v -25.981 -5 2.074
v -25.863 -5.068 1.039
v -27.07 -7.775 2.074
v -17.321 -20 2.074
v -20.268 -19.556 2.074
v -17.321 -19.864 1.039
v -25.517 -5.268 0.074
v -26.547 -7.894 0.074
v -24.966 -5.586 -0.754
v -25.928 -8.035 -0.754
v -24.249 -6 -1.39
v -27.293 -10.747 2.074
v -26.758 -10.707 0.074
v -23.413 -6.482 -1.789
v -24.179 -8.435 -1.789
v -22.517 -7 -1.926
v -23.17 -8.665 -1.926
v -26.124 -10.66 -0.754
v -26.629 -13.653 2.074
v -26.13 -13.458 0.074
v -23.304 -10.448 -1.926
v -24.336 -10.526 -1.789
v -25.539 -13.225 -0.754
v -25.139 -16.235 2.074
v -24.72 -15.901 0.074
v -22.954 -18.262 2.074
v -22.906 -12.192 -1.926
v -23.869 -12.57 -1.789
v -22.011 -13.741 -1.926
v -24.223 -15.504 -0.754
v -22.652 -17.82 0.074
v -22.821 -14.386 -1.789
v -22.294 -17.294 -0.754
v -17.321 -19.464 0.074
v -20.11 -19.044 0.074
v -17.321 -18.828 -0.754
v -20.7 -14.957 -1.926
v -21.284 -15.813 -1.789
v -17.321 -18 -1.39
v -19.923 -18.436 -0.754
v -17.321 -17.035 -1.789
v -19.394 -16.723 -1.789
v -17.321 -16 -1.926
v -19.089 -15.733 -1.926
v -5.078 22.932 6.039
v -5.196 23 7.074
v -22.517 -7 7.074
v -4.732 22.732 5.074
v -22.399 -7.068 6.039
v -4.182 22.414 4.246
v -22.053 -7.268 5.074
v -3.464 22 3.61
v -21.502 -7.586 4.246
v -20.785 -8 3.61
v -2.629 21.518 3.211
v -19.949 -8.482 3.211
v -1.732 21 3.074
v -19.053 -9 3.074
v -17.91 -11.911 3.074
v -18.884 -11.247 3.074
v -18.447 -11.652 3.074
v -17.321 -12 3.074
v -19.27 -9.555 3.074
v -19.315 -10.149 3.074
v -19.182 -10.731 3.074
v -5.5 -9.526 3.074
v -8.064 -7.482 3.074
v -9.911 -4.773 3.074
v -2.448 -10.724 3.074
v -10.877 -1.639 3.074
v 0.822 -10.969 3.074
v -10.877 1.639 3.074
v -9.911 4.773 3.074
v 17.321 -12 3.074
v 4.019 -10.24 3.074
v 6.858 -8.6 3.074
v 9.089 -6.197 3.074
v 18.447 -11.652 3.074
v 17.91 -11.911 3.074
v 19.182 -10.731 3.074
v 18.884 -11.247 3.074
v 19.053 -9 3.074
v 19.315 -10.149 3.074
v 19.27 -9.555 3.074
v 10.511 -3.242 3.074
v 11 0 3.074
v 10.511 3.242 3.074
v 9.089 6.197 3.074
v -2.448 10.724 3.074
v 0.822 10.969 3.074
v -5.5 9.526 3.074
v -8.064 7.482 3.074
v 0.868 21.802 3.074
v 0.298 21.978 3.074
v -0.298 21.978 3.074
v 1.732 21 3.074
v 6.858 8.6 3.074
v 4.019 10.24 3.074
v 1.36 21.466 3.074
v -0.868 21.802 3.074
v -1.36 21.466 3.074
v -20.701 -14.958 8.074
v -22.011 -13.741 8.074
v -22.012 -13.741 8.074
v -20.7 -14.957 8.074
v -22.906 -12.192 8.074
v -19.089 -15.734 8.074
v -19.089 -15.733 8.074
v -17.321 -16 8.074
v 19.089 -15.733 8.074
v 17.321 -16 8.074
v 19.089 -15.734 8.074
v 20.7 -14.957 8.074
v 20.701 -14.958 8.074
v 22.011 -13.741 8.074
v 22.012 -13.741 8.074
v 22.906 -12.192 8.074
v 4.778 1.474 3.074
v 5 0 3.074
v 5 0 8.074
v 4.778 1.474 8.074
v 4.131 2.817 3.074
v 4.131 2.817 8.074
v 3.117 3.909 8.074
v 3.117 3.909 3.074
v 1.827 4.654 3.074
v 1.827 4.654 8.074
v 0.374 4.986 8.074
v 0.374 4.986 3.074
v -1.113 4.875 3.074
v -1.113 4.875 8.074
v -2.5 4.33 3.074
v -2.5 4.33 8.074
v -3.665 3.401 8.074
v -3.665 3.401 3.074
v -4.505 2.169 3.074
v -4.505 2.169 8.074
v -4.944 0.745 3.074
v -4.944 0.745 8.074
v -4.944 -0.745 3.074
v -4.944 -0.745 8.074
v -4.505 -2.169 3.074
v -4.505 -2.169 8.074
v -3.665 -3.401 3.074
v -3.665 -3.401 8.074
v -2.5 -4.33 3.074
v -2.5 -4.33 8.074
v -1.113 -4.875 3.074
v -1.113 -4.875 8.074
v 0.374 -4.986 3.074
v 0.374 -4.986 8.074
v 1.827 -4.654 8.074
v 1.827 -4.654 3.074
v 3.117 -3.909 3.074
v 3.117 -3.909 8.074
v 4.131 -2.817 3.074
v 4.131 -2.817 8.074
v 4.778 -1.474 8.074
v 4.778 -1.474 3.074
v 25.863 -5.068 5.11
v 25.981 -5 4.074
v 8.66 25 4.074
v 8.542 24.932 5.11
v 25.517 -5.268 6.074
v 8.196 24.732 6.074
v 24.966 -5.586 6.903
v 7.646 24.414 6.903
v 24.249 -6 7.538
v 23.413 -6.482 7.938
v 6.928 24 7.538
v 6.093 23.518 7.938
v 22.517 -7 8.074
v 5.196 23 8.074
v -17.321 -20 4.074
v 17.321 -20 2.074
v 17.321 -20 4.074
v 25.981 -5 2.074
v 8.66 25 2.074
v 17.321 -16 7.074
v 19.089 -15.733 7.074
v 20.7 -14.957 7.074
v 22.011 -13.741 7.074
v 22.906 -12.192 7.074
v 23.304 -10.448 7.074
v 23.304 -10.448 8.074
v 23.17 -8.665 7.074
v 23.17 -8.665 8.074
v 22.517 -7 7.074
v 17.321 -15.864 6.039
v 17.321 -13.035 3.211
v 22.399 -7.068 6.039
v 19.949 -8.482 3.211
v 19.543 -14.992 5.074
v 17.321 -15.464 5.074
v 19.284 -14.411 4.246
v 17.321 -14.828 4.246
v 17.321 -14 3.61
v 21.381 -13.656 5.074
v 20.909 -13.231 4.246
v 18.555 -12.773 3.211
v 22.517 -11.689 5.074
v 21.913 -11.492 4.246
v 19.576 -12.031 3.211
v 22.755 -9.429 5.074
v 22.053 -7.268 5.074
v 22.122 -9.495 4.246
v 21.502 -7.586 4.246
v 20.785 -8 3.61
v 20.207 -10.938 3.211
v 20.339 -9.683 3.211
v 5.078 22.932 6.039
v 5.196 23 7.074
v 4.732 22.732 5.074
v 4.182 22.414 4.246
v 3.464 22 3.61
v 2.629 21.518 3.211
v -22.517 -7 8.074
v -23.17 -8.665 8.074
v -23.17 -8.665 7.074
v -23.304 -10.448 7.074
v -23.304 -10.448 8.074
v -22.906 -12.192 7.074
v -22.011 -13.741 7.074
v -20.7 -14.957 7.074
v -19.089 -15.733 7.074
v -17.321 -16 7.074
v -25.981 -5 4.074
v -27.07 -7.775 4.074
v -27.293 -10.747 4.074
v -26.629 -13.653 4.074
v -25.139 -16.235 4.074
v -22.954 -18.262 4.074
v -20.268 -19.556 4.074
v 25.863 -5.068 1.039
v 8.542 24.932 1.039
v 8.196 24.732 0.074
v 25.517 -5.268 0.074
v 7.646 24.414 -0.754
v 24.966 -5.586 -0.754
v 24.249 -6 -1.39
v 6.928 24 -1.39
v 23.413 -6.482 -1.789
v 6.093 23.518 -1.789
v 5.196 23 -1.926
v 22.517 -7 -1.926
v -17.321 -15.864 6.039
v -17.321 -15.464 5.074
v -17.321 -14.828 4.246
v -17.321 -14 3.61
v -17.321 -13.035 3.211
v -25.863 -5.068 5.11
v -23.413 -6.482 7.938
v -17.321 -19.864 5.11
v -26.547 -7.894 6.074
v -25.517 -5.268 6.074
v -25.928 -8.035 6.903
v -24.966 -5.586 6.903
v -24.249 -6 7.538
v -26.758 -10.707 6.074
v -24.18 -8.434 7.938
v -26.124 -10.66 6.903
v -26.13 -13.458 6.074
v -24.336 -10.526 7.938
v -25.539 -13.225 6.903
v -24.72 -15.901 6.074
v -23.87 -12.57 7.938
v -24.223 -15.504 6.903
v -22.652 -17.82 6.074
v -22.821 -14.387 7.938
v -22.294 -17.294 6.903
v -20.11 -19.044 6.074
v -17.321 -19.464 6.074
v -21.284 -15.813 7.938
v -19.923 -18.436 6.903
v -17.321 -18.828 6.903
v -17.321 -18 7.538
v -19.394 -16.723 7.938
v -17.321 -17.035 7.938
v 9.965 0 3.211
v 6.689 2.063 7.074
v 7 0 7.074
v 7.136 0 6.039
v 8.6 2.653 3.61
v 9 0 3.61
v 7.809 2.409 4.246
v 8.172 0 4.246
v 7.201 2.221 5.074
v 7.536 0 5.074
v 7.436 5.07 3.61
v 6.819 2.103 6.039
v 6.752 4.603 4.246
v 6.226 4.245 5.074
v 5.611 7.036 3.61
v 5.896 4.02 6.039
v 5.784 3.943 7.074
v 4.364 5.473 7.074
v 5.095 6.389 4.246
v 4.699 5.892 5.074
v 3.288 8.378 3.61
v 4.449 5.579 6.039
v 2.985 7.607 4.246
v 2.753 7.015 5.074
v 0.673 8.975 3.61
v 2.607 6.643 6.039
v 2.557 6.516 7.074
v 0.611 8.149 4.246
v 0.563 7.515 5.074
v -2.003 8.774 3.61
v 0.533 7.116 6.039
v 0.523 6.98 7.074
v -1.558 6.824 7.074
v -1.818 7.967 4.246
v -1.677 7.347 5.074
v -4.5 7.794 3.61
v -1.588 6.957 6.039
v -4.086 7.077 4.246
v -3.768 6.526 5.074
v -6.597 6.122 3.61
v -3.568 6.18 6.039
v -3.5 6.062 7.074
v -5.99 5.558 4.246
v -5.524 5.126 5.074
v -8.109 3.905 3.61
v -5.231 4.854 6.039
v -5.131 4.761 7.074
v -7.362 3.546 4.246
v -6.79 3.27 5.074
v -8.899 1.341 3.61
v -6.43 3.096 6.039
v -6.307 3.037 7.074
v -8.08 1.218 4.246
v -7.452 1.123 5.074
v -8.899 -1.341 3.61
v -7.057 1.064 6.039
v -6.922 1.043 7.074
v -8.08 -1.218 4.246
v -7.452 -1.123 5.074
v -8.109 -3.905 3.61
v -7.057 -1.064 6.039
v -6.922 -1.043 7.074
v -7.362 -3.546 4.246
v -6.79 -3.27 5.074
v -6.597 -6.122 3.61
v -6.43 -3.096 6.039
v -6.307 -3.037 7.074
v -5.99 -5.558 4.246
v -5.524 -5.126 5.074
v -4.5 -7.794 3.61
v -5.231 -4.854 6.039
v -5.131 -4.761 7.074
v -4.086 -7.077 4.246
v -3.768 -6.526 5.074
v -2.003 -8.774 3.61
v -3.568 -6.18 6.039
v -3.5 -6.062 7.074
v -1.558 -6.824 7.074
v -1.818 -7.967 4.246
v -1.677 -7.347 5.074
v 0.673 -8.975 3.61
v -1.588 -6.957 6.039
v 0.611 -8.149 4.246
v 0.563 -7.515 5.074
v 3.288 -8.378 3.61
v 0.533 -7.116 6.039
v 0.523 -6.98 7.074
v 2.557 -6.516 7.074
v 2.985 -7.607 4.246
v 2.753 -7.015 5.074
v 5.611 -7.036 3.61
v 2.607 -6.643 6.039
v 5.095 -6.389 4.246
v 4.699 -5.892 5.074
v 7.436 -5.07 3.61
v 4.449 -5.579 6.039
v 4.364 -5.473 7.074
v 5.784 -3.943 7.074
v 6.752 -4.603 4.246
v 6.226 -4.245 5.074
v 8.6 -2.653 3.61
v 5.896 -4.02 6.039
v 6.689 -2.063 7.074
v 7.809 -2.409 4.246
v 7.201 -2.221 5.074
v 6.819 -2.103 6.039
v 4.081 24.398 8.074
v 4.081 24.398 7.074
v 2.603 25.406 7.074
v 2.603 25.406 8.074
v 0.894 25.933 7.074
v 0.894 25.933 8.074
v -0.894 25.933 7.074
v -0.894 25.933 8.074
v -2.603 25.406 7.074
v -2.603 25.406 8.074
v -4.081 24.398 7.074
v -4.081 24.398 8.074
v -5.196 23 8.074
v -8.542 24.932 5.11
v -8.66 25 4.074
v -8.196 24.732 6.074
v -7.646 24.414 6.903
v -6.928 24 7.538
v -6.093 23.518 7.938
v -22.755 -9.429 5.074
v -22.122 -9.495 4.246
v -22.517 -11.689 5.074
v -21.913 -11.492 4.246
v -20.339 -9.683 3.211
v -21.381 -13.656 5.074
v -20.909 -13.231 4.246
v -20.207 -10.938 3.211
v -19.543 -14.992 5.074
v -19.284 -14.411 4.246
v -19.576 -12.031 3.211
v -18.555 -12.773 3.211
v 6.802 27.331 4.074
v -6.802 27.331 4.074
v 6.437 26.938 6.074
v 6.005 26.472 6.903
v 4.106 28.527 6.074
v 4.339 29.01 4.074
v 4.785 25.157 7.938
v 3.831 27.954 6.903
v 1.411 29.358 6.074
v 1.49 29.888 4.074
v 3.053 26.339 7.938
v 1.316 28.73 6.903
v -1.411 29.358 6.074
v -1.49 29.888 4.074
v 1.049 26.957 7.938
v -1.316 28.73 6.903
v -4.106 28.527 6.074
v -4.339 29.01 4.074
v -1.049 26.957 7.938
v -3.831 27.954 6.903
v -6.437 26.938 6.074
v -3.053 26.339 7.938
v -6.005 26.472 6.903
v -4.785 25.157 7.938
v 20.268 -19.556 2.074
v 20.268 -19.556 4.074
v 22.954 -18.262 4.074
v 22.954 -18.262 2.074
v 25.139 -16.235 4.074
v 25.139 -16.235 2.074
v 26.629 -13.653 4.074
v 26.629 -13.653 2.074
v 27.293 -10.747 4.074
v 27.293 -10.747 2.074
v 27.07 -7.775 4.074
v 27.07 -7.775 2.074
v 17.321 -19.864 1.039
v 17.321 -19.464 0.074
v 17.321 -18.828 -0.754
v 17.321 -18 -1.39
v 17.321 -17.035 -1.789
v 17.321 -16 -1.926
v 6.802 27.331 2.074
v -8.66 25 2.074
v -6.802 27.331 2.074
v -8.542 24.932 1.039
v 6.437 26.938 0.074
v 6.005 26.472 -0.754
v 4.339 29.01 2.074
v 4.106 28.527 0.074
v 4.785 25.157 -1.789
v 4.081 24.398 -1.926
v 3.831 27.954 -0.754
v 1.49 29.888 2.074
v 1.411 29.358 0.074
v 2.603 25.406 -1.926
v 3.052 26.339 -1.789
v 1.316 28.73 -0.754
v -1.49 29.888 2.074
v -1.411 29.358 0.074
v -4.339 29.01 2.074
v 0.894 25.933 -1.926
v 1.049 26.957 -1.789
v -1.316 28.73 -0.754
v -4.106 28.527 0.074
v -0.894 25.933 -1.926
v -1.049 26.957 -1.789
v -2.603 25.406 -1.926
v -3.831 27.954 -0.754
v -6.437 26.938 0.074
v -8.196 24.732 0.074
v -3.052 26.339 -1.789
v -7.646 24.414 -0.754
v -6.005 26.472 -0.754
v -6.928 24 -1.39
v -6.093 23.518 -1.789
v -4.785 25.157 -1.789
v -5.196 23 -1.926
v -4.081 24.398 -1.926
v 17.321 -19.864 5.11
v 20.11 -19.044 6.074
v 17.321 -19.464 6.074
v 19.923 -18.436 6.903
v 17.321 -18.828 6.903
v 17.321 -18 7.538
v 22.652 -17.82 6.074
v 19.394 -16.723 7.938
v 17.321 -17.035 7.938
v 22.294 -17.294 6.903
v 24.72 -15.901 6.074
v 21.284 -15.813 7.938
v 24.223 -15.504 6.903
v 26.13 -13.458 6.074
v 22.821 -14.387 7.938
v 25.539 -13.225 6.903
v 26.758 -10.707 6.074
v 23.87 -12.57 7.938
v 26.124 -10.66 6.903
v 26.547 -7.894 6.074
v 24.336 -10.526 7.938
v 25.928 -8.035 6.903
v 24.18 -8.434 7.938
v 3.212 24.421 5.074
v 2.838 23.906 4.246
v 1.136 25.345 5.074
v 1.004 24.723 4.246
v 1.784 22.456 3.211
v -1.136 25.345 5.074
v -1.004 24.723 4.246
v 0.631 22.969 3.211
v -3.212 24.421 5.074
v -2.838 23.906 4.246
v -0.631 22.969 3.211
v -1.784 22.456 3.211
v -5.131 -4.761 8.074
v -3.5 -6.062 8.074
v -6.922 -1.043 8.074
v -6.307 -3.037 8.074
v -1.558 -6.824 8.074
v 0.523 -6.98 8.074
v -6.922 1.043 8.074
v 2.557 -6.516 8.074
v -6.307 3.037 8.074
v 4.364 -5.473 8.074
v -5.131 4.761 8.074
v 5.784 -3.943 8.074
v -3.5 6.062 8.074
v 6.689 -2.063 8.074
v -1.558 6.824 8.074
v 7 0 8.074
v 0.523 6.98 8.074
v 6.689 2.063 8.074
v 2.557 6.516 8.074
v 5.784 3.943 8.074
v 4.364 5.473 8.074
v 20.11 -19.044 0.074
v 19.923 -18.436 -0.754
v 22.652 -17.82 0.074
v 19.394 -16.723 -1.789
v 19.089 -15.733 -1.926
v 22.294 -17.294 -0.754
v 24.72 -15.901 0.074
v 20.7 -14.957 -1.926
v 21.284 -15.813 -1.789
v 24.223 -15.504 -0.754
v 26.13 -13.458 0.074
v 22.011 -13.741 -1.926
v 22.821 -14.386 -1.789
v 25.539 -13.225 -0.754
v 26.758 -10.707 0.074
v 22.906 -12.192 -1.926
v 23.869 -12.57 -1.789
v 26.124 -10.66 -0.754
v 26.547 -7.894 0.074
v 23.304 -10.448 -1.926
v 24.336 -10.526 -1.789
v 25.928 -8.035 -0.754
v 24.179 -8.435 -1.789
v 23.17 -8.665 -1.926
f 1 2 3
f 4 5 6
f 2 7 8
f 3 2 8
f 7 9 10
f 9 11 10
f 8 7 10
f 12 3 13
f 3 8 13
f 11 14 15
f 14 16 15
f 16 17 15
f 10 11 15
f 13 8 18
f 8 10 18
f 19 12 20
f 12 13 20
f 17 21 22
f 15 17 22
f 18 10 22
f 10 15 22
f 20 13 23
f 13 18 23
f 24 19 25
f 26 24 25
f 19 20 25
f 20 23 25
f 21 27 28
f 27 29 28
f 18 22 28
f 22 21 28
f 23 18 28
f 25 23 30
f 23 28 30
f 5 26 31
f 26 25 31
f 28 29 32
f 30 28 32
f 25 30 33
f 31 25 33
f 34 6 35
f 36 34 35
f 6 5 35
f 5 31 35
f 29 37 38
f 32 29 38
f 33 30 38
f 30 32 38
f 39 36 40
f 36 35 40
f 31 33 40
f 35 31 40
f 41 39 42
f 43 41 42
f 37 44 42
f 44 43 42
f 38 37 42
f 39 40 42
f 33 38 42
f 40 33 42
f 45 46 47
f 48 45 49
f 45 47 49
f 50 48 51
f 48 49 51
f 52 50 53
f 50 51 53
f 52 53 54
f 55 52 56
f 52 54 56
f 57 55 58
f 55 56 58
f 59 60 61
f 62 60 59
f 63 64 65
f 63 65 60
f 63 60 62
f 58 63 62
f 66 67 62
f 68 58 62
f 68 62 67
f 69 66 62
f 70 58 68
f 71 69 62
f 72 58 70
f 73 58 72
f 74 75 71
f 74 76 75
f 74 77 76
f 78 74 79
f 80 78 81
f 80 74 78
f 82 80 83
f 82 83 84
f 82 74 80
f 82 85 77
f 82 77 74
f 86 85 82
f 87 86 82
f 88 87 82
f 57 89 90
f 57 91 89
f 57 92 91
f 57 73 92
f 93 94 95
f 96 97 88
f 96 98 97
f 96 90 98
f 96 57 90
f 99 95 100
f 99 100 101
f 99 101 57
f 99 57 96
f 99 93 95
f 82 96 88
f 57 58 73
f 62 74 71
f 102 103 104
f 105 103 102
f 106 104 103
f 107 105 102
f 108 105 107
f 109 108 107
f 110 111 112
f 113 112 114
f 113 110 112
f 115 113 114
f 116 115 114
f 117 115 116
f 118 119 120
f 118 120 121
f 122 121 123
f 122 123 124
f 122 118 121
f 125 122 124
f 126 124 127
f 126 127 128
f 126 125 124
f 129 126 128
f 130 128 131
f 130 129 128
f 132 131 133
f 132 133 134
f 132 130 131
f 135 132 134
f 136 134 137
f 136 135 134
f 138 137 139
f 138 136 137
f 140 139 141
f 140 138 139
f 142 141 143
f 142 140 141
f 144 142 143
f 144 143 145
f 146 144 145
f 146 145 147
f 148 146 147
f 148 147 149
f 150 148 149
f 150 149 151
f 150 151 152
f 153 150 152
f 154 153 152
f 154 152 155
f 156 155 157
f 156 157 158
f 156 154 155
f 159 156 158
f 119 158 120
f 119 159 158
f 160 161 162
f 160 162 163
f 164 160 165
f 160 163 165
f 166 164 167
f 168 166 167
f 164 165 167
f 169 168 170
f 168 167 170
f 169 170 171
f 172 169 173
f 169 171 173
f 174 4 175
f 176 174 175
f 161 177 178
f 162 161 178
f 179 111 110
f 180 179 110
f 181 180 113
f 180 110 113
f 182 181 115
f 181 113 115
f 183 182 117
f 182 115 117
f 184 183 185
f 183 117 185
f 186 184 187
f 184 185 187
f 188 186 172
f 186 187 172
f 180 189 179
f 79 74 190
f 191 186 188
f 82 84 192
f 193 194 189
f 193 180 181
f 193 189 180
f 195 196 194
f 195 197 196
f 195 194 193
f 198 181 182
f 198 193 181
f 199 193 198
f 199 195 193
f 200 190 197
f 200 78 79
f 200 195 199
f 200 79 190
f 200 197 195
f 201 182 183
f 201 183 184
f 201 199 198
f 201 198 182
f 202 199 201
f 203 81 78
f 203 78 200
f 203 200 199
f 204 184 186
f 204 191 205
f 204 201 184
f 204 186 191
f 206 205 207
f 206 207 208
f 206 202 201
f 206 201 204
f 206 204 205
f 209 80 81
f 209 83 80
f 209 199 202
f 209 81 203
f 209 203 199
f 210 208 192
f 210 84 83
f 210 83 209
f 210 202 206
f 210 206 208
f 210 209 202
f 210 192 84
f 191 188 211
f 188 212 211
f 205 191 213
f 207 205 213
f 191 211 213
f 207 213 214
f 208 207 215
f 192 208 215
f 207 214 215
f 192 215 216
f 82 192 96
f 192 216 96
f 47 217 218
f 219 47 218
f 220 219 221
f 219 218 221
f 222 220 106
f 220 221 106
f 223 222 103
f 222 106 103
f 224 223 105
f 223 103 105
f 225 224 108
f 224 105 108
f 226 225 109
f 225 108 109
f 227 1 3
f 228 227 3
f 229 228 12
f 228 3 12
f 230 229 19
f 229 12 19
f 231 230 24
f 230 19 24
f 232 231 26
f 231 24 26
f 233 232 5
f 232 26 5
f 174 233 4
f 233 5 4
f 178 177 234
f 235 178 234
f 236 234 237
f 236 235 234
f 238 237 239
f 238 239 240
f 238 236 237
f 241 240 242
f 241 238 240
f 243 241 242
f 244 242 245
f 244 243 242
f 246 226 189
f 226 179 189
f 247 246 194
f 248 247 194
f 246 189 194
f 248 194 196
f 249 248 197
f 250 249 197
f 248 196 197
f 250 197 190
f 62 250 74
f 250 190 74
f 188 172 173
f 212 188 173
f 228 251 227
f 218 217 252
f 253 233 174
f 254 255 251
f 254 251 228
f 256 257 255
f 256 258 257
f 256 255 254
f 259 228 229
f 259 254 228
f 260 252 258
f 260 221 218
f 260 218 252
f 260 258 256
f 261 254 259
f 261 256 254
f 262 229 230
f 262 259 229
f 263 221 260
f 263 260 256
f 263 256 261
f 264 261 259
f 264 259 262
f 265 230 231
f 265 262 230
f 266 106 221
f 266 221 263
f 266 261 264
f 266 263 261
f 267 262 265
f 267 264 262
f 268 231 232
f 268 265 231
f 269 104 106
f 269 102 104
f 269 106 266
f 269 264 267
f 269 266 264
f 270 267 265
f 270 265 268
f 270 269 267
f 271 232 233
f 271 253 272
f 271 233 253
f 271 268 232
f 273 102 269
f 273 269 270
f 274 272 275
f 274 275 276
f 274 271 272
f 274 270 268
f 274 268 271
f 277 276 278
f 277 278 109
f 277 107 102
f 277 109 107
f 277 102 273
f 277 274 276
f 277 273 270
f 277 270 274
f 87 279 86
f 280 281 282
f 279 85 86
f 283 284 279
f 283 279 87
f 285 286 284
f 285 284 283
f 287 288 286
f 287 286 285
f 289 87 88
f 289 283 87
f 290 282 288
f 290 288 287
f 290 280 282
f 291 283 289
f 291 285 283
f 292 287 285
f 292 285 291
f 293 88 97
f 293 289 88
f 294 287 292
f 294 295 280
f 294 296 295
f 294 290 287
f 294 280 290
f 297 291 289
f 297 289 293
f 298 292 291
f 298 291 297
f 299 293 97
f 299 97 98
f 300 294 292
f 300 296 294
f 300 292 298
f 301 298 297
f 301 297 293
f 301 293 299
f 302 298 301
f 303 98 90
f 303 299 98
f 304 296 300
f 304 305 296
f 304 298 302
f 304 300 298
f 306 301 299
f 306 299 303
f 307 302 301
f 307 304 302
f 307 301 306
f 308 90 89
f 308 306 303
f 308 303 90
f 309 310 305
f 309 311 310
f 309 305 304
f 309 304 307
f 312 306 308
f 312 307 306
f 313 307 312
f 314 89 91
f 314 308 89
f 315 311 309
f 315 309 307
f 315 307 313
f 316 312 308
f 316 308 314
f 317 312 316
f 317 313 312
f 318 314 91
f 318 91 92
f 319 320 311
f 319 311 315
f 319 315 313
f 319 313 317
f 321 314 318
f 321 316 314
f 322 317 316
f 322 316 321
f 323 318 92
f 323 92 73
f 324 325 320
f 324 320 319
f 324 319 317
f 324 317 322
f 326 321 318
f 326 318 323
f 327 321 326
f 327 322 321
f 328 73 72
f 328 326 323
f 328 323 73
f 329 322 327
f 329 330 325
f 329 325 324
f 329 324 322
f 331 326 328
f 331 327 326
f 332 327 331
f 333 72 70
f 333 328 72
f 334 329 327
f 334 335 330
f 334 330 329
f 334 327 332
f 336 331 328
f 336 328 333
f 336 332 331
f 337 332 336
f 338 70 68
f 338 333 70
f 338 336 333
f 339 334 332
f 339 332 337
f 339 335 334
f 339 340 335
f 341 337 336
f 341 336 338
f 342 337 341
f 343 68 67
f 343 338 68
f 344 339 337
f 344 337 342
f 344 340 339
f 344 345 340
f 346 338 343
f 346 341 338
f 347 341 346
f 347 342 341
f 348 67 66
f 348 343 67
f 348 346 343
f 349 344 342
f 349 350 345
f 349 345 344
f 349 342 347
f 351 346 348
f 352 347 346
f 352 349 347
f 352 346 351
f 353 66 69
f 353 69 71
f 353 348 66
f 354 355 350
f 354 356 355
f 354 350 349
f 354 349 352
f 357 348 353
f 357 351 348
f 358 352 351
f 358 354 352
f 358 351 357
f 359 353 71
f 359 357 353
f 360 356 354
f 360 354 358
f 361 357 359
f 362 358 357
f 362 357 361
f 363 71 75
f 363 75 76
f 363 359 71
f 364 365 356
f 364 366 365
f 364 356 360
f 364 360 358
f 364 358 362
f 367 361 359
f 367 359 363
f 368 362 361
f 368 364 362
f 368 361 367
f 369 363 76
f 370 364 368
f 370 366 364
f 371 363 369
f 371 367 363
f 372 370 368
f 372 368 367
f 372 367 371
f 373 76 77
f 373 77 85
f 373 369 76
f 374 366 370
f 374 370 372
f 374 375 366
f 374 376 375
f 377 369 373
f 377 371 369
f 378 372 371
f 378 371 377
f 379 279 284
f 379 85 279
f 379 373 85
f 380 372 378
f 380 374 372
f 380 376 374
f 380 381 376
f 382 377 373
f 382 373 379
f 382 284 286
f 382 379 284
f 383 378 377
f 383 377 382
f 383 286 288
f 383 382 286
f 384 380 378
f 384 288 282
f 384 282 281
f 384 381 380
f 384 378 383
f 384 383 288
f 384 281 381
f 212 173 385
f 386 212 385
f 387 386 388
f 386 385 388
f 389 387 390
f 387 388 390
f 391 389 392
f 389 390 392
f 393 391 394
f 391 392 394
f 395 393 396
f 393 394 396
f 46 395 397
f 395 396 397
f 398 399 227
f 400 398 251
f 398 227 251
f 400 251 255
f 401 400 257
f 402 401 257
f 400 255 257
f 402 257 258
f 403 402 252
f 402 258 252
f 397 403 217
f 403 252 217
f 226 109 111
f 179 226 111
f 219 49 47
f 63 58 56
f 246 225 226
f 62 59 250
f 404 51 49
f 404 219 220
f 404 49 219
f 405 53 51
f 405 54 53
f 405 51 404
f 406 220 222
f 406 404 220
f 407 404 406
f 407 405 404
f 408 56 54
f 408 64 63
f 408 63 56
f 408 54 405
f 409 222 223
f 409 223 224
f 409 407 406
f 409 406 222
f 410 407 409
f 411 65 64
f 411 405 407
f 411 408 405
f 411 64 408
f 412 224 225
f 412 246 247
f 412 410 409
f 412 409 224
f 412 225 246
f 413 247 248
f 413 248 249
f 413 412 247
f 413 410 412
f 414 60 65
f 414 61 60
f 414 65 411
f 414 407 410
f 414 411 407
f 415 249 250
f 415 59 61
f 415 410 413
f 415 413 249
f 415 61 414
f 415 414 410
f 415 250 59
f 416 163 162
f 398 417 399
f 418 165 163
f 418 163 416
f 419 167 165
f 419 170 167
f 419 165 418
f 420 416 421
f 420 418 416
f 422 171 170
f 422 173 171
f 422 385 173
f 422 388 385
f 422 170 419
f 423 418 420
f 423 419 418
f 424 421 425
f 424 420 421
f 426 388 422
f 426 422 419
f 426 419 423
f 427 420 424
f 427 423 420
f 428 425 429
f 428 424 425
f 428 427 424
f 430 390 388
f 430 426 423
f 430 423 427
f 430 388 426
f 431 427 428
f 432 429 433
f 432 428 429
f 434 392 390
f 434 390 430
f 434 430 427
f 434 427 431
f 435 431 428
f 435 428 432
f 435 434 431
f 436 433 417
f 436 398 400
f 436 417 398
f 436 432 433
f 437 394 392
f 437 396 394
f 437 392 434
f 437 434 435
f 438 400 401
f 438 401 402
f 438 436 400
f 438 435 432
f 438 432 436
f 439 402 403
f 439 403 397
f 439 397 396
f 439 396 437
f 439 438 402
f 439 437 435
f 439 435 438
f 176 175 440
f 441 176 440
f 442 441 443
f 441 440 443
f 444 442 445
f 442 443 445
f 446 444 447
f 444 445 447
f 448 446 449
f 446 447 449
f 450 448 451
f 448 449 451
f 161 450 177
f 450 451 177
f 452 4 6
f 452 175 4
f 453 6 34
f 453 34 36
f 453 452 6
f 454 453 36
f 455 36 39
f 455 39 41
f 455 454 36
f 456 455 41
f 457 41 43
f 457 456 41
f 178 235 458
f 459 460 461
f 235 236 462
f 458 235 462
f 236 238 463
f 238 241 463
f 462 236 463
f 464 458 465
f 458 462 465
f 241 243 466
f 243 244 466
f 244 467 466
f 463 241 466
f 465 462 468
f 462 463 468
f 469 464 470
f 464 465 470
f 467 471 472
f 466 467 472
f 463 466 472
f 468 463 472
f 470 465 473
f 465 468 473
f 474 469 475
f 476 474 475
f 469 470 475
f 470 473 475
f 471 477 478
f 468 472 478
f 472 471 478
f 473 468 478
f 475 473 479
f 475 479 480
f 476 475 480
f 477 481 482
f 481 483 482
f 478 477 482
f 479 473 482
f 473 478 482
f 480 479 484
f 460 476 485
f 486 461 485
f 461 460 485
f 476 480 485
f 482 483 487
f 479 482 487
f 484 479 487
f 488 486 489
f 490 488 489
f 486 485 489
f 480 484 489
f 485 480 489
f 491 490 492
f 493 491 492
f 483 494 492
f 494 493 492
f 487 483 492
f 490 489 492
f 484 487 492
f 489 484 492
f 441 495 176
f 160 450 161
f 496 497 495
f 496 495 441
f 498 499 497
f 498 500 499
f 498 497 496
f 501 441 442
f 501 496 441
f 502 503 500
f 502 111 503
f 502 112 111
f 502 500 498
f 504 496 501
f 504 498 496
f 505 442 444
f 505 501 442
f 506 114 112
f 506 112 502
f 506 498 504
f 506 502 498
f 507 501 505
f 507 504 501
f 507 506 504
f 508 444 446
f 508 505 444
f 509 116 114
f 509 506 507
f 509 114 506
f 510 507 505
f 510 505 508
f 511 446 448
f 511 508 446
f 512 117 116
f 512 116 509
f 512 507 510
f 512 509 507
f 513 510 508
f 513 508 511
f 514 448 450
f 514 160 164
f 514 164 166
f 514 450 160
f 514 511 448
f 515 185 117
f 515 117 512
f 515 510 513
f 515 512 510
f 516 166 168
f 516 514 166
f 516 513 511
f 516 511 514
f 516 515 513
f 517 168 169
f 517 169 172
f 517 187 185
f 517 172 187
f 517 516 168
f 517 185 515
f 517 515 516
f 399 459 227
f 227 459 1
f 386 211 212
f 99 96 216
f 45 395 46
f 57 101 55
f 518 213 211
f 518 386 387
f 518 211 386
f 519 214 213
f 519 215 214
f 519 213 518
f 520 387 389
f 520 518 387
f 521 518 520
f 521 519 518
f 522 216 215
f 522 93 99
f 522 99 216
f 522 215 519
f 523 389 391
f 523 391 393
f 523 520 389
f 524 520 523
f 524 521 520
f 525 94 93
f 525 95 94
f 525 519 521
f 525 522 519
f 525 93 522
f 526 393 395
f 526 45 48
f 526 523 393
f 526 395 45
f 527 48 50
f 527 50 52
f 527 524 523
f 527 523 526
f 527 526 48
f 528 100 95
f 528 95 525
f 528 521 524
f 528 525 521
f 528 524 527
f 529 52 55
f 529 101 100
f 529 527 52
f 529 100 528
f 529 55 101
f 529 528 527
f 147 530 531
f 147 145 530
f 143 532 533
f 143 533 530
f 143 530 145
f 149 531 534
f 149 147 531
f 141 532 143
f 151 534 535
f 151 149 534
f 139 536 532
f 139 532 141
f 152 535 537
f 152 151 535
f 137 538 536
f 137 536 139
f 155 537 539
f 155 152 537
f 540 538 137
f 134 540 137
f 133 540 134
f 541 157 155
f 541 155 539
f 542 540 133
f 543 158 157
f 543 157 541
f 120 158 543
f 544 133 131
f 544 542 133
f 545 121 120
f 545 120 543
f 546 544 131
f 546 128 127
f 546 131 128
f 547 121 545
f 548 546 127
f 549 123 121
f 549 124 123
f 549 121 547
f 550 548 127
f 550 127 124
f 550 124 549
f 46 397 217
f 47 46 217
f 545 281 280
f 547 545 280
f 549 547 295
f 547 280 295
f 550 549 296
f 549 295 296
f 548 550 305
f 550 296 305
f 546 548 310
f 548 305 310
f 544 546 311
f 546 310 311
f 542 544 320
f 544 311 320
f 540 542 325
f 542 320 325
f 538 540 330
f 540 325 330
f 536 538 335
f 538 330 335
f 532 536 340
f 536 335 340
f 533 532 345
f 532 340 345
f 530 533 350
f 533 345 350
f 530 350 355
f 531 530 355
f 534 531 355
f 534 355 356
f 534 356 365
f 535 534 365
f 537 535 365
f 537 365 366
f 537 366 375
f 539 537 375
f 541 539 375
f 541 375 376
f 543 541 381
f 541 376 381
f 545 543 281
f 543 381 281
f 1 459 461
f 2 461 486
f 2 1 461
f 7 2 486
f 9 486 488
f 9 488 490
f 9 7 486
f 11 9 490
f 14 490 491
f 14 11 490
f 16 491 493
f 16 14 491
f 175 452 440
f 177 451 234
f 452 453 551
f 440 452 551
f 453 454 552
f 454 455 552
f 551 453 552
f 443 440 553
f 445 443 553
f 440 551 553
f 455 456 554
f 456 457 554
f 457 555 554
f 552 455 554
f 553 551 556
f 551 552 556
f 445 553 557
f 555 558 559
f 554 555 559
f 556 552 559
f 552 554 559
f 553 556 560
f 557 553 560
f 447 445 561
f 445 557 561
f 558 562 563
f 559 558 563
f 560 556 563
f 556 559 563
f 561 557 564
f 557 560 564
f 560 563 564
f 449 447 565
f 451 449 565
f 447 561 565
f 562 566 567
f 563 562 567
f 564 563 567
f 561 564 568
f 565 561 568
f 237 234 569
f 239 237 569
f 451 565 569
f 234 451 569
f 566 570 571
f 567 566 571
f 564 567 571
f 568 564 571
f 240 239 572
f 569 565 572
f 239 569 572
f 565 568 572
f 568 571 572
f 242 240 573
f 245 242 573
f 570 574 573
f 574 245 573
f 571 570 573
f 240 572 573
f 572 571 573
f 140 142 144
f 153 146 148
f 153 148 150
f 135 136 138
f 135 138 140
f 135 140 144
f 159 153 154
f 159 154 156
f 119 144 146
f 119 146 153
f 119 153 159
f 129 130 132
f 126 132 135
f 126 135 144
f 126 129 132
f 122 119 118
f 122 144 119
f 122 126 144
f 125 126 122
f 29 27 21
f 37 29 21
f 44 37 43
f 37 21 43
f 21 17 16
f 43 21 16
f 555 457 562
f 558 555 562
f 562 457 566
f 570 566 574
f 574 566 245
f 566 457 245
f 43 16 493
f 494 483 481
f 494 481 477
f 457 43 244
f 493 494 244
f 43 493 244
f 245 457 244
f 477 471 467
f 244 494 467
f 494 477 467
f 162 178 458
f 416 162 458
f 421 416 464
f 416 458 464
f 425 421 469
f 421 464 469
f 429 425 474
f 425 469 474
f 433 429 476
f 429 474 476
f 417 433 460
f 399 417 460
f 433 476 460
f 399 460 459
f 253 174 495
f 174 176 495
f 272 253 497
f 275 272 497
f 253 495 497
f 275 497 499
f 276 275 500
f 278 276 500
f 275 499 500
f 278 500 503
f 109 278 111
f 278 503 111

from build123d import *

# Parameters (mm, degrees)
EXTRUDE_1_DEPTH     = 5
CUT_EXTRUDE_1_DEPTH = 2.5
SKETCH_4_R          = 3.5
SKETCH_4_R_2        = 2.5
EXTRUDE_2_DEPTH     = 2.5
FILLET_1_R          = 2
FILLET_2_R          = 2
FILLET_3_R          = 2
SCALE_1_SCALE       = 2


with BuildPart() as part:
    # 草图2 → 凸台-拉伸1 (new body)
    with BuildSketch(Plane.XY):
        with BuildLine():
            Line((12.990381057, -2.5), (4.330127019, 12.5))
            ThreePointArc((4.330127019, 12.5), (0, 15), (-4.330127019, 12.5))
            Line((-4.330127019, 12.5), (-12.990381057, -2.5))
            ThreePointArc((-12.990381057, -2.5), (-12.990381057, -7.5), (-8.660254038, -10))
            Line((-8.660254038, -10), (8.660254038, -10))
            ThreePointArc((8.660254038, -10), (12.990381057, -7.5), (12.990381057, -2.5))
        make_face()
    extrude(amount=EXTRUDE_1_DEPTH)

    # 草图3 → 切除-拉伸1 (cut)
    with BuildSketch(Plane.XY.offset(5)):
        with BuildLine():
            Line((11.258330249, -3.5), (2.598076211, 11.5))
            ThreePointArc((2.598076211, 11.5), (0, 13), (-2.598076211, 11.5))
            Line((-2.598076211, 11.5), (-11.258330249, -3.5))
            ThreePointArc((-11.258330249, -3.5), (-11.258330249, -6.5), (-8.660254038, -8))
            Line((-8.660254038, -8), (8.660254038, -8))
            ThreePointArc((8.660254038, -8), (11.258330249, -6.5), (11.258330249, -3.5))
        make_face()
    extrude(amount=-CUT_EXTRUDE_1_DEPTH, mode=Mode.SUBTRACT)

    # 草图4 → 凸台-拉伸2 (add)
    with BuildSketch(Plane.XY.offset(2.5)):
        Circle(SKETCH_4_R)
        Circle(SKETCH_4_R_2, mode=Mode.SUBTRACT)
    extrude(amount=EXTRUDE_2_DEPTH)

    # 圆角1
    fillet_1_edges = [part.edges().sort_by_distance(p)[0] for p in [
        (0, 15, 5),
        (-8.660254038, 5, 5),
        (-12.990381057, -7.5, 5),
        (0, -10, 5),
        (12.990381057, -7.5, 5),
        (8.660254038, 5, 5),
    ]]
    fillet(fillet_1_edges, radius=FILLET_1_R - 0.0001)  # a hair under: the kernel refuses the full size

    # 圆角2
    fillet_2_edges = [part.edges().sort_by_distance(p)[0] for p in [
        (11.258330249, -6.5, 2.5),
        (0, -8, 2.5),
        (-11.258330249, -6.5, 2.5),
        (-6.92820323, 4, 2.5),
        (0, 13, 2.5),
        (6.92820323, 4, 2.5),
        (-3.5, 0, 2.5),
    ]]
    fillet(fillet_2_edges, radius=FILLET_2_R)

    # 圆角3
    fillet_3_edges = [part.edges().sort_by_distance(p)[0] for p in [
        (0, -10, 0),
        (-12.990381057, -7.5, 0),
        (-8.660254038, 5, 0),
        (0, 15, 0),
        (8.660254038, 5, 0),
        (12.990381057, -7.5, 0),
    ]]
    fillet(fillet_3_edges, radius=FILLET_3_R)


with BuildPart() as part_1:
    # 缩放比例1: scaled about (0, 0, 1.925767513)
    add(part.part.scale(SCALE_1_SCALE).moved(Location((0, 0, -1.925767513))))


solid = part_1.part
